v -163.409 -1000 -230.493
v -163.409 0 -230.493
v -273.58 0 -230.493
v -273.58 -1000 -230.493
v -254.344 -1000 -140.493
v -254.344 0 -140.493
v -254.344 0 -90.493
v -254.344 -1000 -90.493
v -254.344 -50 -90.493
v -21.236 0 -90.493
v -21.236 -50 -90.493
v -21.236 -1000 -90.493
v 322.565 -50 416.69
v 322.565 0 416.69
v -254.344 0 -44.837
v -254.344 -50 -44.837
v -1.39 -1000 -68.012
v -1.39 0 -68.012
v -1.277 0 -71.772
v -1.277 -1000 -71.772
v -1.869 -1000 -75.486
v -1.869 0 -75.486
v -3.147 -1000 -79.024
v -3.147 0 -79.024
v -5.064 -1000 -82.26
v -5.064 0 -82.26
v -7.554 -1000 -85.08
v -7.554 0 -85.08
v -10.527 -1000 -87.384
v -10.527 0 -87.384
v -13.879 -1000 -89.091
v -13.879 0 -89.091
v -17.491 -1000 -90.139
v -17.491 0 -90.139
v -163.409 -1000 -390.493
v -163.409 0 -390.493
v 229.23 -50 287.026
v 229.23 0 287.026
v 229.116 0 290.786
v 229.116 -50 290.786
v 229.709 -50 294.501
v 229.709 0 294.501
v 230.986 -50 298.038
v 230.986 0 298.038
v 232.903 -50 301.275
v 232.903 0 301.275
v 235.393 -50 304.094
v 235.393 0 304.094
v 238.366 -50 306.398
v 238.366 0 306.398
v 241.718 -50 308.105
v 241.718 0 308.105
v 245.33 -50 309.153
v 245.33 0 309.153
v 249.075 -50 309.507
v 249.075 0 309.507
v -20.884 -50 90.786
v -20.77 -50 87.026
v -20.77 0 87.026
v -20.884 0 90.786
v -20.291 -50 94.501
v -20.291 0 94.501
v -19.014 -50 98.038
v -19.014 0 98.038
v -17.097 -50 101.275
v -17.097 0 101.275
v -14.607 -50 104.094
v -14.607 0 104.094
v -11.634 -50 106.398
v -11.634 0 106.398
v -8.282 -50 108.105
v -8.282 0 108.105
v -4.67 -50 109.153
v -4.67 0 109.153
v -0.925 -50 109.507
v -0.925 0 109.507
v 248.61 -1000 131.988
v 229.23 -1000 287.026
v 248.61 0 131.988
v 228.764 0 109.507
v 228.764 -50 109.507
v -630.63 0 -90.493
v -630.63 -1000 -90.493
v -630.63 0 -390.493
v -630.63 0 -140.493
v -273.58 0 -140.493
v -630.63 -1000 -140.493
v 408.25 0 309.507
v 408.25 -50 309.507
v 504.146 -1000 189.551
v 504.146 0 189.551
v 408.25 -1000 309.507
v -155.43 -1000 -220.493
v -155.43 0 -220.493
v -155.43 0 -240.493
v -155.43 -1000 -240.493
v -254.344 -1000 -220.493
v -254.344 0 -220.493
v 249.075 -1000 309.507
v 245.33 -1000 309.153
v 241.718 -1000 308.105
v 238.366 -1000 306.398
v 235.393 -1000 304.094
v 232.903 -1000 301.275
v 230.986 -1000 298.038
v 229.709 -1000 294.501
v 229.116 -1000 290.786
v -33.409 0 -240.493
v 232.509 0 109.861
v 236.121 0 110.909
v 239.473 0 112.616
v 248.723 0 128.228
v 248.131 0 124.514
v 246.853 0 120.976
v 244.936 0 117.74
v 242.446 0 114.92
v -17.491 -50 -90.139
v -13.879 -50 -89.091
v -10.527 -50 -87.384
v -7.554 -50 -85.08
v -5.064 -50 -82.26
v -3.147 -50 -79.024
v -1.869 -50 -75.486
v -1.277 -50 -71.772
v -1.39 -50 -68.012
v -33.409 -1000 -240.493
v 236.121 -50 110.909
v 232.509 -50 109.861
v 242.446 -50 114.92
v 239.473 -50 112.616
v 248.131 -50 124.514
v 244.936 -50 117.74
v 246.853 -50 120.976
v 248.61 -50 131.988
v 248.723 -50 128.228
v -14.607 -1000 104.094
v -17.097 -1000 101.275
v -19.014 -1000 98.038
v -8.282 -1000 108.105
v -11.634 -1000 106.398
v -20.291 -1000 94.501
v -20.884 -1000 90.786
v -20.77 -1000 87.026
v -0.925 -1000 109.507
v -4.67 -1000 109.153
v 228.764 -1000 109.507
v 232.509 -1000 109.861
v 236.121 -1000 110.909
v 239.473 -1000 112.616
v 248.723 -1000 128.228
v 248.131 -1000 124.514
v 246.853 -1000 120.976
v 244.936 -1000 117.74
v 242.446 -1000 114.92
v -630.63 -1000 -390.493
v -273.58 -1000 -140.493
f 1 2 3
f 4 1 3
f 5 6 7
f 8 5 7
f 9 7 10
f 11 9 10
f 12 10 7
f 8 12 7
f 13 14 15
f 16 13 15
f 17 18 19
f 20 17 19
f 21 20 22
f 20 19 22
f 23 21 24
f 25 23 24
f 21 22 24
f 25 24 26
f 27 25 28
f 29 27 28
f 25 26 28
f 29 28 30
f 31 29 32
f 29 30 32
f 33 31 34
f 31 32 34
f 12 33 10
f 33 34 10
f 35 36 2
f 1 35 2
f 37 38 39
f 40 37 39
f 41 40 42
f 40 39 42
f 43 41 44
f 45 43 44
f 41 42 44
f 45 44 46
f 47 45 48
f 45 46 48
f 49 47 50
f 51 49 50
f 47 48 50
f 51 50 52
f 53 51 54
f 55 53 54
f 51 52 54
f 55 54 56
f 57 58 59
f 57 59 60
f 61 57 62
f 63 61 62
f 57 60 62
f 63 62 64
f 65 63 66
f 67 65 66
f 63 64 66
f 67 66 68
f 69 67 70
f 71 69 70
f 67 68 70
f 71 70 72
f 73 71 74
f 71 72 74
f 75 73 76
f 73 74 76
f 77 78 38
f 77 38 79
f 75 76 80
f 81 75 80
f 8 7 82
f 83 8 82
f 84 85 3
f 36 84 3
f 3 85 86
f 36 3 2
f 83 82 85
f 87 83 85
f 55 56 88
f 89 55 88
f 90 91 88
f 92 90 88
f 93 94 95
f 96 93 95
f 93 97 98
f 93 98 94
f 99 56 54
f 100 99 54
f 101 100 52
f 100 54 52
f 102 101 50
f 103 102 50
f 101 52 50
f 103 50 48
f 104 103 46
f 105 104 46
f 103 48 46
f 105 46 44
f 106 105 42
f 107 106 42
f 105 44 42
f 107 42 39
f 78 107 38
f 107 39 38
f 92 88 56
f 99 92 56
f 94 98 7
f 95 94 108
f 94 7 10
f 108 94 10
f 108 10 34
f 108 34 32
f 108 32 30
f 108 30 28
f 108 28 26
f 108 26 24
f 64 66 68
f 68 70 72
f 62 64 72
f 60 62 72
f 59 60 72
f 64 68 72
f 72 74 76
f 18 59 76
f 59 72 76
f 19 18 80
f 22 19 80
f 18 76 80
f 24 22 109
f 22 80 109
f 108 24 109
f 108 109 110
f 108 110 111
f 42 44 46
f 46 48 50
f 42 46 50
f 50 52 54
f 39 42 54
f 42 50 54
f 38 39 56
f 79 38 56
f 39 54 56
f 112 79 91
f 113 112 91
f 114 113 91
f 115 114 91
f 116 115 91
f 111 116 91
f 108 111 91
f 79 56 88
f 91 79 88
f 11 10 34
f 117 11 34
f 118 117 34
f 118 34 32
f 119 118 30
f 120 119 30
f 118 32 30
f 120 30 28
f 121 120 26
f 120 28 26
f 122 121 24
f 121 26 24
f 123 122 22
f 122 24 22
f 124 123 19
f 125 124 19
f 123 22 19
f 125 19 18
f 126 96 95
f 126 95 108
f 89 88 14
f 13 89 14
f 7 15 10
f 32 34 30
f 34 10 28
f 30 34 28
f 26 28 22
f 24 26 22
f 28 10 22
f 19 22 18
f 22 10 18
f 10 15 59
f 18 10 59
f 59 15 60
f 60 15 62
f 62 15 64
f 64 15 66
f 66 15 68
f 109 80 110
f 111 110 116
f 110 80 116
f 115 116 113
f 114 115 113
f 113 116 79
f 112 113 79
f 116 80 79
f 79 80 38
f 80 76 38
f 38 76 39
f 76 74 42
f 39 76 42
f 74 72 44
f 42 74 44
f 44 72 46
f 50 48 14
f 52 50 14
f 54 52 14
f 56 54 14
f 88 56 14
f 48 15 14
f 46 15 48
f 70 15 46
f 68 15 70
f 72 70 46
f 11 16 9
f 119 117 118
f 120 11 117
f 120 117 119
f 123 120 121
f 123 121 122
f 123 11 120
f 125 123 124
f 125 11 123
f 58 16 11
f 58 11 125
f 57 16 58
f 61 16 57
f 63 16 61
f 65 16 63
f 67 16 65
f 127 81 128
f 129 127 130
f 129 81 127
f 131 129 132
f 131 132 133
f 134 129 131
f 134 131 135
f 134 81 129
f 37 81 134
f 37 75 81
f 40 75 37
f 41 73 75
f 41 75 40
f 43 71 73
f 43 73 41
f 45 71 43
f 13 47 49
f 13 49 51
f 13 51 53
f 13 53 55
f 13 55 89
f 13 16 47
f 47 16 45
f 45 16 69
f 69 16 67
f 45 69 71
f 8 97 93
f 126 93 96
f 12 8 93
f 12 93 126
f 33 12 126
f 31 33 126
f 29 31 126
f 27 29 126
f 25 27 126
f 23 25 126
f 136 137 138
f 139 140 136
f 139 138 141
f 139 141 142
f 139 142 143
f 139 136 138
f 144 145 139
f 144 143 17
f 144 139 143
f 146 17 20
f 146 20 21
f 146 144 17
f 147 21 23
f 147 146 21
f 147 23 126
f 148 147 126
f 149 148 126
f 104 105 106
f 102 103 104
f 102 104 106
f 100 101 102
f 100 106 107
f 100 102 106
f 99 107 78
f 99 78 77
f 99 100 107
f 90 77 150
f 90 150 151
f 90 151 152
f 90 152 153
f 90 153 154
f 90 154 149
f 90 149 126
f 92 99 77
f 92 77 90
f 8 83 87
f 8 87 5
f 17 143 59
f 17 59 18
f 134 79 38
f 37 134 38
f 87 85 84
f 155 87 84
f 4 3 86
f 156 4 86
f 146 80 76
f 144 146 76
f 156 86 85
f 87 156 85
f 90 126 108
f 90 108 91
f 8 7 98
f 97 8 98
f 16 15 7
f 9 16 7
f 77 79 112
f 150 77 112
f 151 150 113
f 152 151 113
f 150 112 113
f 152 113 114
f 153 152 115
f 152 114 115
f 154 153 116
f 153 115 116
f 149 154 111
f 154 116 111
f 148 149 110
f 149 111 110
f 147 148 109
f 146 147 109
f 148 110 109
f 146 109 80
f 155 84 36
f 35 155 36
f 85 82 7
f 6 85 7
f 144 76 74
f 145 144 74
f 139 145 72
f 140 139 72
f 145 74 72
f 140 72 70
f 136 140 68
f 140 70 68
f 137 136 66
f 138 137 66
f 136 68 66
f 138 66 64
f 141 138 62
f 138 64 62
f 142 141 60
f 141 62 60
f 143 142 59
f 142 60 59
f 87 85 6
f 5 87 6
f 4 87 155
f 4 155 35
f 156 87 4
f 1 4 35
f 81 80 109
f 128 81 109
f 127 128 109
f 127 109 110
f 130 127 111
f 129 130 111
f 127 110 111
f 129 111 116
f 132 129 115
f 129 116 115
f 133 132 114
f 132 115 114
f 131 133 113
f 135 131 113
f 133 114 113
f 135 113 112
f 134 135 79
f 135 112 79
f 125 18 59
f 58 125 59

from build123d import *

# Parameters (mm, degrees)
F1_DEPTH = 1000
F2_DEPTH = 50
F3_DEPTH = 1000
F4_DEPTH = 1000


# Not quite as in the source:
# - ends of sketch curves that miss each other by under 0.0002 mm in the source are joined


with BuildPart() as f1:
    # F0 (on Front) → F1 (new body)
    with BuildSketch(Plane.XZ):
        with BuildLine():
            Line((-21.236031, -90.492915), (-254.343951, -90.492915))
            Line((-254.343951, -90.492915), (-254.343951, -140.492915))
            Line((-254.343951, -140.492915), (-254.343951, -220.492915))
            Line((-254.343951, -220.492915), (-155.429775, -220.492915))
            Line((-155.429775, -220.492915), (-155.429775, -240.492915))
            Line((-155.429775, -240.492915), (-33.408643, -240.492915))
            Line((-33.408643, -240.492915), (154.0913568979, -90.4929148724))
            Line((154.0913568979, -90.4929148724), (504.14619, 189.550952))
            Line((504.14619, 189.550952), (408.249622949, 309.5070849592))
            Line((408.249622949, 309.5070849592), (249.075257, 309.507085))
            ThreePointArc((249.075257, 309.507085), (234.0816933606, 302.7431361252), (229.2296995119, 287.026389939))
            Line((229.2296995119, 287.026389939), (248.609526, 131.987779))
            ThreePointArc((248.609526, 131.987779), (243.7575323111, 116.2710335028), (228.763969, 109.507085))
            Line((228.763969, 109.507085), (-0.924743, 109.507085))
            ThreePointArc((-0.924743, 109.507085), (-15.9183066394, 102.7431361252), (-20.7703004881, 87.026389939))
            Line((-20.7703004881, 87.026389939), (-1.390474, -68.012221))
            ThreePointArc((-1.390474, -68.012221), (-6.2424676889, -83.7289664972), (-21.236031, -90.492915))
        make_face()
    extrude(amount=F1_DEPTH)


with BuildPart() as f2:
    # F0 (on Front) → F2 (new body)
    with BuildSketch(Plane.XZ):
        with BuildLine():
            Line((-254.343951, -44.837372), (-254.343951, -90.492915))
            Line((-254.343951, -90.492915), (-21.236031, -90.492915))
            ThreePointArc((-21.236031, -90.492915), (-6.2424676889, -83.7289664972), (-1.3904733888, -68.0122209236))
            Line((-1.3904733888, -68.0122209236), (-20.7703, 87.02639))
            ThreePointArc((-20.7703, 87.02639), (-15.9183066394, 102.7431361252), (-0.924743, 109.507085))
            Line((-0.924743, 109.507085), (228.763969, 109.507085))
            ThreePointArc((228.763969, 109.507085), (243.7575323111, 116.2710335028), (248.6095266112, 131.9877790764))
            Line((248.6095266112, 131.9877790764), (229.2297, 287.02639))
            ThreePointArc((229.2297, 287.02639), (234.0816933606, 302.7431361252), (249.075257, 309.507085))
            Line((249.075257, 309.507085), (408.249623, 309.507085))
            Line((408.249623, 309.507085), (322.5647089299, 416.689554944))
            Line((322.5647089299, 416.689554944), (-254.343951, -44.837372))
        make_face()
    extrude(amount=F2_DEPTH)


with BuildPart() as f3:
    # F0 (on Front) → F3 (new body)
    with BuildSketch(Plane.XZ):
        Polygon((-273.580387, -140.492915), (-630.630191, -140.492915), (-630.630191, -390.492915), (-163.408643, -390.492915), (-163.408643, -230.492915), (-273.580387, -230.492915), align=None)
    extrude(amount=F3_DEPTH)


with BuildPart() as f4:
    # F0 (on Front) → F4 (new body)
    with BuildSketch(Plane.XZ):
        Polygon((-254.343951, -140.492915), (-254.343951, -90.492915), (-630.630191, -90.492915), (-630.630191, -140.492915), (-273.580387, -140.492915), align=None)
    extrude(amount=F4_DEPTH)


solid = Compound([f1.part, f2.part, f3.part, f4.part])
